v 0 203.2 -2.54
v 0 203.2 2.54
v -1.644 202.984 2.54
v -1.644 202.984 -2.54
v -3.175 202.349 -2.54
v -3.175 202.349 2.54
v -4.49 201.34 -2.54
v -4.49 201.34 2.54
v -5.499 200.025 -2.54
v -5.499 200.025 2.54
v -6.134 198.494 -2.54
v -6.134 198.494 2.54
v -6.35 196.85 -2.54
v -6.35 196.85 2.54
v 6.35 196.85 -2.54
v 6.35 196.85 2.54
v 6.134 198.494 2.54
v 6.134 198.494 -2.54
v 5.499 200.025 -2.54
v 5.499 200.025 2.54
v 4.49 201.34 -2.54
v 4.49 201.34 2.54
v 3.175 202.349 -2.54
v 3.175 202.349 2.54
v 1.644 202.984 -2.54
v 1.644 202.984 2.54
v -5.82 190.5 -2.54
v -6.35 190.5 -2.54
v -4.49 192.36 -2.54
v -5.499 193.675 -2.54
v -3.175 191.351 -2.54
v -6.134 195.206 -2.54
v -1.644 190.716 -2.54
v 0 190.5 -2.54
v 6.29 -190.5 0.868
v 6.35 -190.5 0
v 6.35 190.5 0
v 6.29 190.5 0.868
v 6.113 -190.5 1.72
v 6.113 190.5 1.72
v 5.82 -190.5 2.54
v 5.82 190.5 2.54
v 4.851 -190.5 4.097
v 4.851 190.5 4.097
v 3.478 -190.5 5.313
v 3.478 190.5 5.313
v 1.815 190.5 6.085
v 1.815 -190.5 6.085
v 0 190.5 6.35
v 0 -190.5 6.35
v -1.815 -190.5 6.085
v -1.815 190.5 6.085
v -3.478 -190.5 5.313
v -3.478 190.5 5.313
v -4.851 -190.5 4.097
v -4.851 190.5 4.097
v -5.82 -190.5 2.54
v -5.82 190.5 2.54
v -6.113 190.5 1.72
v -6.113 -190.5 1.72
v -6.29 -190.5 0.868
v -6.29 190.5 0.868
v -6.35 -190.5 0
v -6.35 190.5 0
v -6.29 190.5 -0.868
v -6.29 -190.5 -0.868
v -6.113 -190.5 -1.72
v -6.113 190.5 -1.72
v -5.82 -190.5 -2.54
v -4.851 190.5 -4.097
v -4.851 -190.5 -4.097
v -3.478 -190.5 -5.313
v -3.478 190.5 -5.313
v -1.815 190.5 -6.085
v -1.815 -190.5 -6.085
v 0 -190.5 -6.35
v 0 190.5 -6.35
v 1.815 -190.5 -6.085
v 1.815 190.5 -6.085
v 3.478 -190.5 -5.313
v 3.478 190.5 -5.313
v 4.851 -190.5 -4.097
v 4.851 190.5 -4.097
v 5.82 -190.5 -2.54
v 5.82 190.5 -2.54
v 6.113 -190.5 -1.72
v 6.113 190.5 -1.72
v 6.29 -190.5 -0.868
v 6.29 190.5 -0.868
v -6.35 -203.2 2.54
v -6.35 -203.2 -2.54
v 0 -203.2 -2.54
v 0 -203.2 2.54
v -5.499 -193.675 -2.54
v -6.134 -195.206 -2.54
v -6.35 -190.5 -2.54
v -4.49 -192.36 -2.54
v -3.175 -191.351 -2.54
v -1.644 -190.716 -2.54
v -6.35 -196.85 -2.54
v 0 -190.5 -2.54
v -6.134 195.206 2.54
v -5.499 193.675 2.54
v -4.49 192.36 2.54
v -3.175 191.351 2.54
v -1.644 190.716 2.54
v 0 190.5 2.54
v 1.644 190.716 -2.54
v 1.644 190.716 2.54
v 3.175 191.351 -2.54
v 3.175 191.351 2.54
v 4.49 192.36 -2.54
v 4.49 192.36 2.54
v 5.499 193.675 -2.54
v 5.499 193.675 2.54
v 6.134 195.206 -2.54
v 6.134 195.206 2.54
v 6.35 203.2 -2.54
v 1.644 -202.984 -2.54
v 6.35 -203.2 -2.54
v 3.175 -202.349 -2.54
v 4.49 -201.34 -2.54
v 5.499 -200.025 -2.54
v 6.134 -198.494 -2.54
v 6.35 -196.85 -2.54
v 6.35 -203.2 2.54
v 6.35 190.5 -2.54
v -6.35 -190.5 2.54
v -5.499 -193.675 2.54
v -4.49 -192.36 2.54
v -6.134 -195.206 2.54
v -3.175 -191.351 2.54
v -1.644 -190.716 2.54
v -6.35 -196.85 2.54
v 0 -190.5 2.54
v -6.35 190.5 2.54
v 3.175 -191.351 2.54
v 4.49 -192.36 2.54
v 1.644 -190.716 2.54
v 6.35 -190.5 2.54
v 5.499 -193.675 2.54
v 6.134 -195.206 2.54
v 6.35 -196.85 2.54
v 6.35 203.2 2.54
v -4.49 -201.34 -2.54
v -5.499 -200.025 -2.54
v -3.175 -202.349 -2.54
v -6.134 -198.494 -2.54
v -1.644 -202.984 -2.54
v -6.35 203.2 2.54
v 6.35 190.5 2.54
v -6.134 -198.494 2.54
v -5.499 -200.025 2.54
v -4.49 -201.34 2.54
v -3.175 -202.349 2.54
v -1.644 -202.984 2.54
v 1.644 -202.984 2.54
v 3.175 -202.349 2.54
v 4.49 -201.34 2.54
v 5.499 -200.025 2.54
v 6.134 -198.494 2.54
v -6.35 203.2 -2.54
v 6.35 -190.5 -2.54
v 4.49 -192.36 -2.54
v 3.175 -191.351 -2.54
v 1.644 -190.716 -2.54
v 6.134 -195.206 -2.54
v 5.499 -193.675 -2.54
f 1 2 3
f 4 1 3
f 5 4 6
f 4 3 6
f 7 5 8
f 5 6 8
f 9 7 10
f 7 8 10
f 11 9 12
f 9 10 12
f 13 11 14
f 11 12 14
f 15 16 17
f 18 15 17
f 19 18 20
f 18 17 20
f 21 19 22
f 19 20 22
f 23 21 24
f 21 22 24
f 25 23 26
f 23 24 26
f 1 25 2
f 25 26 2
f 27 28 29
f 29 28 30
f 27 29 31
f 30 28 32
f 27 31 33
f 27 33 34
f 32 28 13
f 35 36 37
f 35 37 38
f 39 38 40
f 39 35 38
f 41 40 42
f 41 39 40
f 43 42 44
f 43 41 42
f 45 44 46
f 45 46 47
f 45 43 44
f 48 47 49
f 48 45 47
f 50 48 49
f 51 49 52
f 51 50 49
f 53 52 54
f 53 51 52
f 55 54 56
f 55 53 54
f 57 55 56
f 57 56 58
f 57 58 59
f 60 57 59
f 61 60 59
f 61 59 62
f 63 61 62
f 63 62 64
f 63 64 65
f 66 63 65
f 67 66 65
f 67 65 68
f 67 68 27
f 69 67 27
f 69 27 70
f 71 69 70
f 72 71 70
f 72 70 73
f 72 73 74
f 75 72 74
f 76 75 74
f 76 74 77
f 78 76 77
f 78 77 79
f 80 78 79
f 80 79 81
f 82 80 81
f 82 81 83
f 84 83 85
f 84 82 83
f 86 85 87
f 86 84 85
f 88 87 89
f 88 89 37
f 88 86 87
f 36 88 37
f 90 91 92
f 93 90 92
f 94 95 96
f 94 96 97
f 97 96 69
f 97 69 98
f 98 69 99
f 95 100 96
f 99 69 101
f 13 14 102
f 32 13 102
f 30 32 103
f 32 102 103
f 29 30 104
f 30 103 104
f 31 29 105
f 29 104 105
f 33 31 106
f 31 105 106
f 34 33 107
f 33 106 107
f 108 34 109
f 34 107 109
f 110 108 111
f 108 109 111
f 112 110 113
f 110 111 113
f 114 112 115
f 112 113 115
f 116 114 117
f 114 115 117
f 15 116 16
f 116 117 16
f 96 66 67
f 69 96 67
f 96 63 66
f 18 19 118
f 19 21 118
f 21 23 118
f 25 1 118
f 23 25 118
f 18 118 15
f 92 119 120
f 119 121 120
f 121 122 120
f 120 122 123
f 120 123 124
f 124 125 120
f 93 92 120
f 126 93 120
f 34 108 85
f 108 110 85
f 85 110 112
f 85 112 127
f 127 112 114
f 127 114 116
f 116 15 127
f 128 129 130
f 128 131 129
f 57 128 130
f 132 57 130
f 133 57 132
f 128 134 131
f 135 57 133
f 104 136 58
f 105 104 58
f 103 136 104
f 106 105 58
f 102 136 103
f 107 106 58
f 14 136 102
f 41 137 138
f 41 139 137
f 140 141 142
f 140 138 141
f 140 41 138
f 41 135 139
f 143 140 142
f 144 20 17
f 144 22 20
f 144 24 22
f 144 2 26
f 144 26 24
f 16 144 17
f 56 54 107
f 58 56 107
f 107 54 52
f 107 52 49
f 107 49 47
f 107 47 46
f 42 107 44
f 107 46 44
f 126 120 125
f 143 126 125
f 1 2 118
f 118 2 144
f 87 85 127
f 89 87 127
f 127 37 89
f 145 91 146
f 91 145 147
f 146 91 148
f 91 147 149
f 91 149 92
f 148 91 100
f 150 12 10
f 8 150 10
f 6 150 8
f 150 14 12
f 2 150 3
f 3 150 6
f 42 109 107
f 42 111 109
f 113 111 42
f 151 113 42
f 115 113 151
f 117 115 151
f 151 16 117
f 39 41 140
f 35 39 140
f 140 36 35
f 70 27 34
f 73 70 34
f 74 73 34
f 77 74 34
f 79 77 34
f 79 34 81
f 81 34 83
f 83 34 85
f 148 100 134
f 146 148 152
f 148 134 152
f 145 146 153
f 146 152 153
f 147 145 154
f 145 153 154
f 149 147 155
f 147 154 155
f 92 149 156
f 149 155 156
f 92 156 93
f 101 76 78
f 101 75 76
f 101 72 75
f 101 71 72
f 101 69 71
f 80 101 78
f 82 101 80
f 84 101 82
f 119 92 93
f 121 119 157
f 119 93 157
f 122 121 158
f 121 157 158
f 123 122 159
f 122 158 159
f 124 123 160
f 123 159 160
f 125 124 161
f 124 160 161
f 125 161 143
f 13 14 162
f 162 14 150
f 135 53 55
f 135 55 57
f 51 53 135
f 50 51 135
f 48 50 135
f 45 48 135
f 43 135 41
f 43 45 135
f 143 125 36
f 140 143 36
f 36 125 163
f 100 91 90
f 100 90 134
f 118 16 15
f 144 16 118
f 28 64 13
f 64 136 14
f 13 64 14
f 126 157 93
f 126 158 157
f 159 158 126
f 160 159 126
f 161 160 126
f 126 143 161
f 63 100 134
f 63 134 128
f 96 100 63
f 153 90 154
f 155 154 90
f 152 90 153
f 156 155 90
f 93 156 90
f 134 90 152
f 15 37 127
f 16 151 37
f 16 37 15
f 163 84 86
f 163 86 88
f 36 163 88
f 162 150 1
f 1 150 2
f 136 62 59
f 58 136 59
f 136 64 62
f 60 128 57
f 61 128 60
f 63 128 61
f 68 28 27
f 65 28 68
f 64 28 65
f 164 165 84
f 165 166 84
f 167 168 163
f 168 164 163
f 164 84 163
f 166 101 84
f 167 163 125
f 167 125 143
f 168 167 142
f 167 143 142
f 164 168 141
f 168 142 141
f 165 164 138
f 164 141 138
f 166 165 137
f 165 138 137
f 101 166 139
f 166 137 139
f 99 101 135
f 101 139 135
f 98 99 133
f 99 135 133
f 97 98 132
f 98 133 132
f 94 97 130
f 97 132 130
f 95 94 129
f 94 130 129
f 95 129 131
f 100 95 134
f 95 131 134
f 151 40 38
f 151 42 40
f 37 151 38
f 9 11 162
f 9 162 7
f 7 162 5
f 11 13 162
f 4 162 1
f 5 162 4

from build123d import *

# Parameters (mm, degrees)
F0_R     = 6.35
F1_DEPTH = 190.5
F2_W     = 12.7
F2_H     = 12.7
F3_DEPTH = 2.54
F4_R     = 6.35
F5_DEPTH = 8.891


with BuildPart() as f1:
    # F0 (on Front) → F1 (new body, symmetric)
    with BuildSketch(Plane.XZ):
        Circle(F0_R)
    extrude(amount=F1_DEPTH, both=True)

    # F2 (on Top) → F3 (join, symmetric)
    with BuildSketch(Plane.XY):
        with Locations((0, -196.85)):
            Rectangle(F2_W, F2_H)
        with Locations((0, 196.85)):
            Rectangle(F2_W, F2_H)
    extrude(amount=F3_DEPTH, both=True)

    # F4 (on face) → F5 (cut, through all)
    with BuildSketch(Plane.XY.offset(2.54)):
        with Locations((0, 196.85)):
            Circle(F4_R)
        with Locations((0, -196.85)):
            Circle(F4_R)
    extrude(amount=-F5_DEPTH, mode=Mode.SUBTRACT)


solid = f1.part
